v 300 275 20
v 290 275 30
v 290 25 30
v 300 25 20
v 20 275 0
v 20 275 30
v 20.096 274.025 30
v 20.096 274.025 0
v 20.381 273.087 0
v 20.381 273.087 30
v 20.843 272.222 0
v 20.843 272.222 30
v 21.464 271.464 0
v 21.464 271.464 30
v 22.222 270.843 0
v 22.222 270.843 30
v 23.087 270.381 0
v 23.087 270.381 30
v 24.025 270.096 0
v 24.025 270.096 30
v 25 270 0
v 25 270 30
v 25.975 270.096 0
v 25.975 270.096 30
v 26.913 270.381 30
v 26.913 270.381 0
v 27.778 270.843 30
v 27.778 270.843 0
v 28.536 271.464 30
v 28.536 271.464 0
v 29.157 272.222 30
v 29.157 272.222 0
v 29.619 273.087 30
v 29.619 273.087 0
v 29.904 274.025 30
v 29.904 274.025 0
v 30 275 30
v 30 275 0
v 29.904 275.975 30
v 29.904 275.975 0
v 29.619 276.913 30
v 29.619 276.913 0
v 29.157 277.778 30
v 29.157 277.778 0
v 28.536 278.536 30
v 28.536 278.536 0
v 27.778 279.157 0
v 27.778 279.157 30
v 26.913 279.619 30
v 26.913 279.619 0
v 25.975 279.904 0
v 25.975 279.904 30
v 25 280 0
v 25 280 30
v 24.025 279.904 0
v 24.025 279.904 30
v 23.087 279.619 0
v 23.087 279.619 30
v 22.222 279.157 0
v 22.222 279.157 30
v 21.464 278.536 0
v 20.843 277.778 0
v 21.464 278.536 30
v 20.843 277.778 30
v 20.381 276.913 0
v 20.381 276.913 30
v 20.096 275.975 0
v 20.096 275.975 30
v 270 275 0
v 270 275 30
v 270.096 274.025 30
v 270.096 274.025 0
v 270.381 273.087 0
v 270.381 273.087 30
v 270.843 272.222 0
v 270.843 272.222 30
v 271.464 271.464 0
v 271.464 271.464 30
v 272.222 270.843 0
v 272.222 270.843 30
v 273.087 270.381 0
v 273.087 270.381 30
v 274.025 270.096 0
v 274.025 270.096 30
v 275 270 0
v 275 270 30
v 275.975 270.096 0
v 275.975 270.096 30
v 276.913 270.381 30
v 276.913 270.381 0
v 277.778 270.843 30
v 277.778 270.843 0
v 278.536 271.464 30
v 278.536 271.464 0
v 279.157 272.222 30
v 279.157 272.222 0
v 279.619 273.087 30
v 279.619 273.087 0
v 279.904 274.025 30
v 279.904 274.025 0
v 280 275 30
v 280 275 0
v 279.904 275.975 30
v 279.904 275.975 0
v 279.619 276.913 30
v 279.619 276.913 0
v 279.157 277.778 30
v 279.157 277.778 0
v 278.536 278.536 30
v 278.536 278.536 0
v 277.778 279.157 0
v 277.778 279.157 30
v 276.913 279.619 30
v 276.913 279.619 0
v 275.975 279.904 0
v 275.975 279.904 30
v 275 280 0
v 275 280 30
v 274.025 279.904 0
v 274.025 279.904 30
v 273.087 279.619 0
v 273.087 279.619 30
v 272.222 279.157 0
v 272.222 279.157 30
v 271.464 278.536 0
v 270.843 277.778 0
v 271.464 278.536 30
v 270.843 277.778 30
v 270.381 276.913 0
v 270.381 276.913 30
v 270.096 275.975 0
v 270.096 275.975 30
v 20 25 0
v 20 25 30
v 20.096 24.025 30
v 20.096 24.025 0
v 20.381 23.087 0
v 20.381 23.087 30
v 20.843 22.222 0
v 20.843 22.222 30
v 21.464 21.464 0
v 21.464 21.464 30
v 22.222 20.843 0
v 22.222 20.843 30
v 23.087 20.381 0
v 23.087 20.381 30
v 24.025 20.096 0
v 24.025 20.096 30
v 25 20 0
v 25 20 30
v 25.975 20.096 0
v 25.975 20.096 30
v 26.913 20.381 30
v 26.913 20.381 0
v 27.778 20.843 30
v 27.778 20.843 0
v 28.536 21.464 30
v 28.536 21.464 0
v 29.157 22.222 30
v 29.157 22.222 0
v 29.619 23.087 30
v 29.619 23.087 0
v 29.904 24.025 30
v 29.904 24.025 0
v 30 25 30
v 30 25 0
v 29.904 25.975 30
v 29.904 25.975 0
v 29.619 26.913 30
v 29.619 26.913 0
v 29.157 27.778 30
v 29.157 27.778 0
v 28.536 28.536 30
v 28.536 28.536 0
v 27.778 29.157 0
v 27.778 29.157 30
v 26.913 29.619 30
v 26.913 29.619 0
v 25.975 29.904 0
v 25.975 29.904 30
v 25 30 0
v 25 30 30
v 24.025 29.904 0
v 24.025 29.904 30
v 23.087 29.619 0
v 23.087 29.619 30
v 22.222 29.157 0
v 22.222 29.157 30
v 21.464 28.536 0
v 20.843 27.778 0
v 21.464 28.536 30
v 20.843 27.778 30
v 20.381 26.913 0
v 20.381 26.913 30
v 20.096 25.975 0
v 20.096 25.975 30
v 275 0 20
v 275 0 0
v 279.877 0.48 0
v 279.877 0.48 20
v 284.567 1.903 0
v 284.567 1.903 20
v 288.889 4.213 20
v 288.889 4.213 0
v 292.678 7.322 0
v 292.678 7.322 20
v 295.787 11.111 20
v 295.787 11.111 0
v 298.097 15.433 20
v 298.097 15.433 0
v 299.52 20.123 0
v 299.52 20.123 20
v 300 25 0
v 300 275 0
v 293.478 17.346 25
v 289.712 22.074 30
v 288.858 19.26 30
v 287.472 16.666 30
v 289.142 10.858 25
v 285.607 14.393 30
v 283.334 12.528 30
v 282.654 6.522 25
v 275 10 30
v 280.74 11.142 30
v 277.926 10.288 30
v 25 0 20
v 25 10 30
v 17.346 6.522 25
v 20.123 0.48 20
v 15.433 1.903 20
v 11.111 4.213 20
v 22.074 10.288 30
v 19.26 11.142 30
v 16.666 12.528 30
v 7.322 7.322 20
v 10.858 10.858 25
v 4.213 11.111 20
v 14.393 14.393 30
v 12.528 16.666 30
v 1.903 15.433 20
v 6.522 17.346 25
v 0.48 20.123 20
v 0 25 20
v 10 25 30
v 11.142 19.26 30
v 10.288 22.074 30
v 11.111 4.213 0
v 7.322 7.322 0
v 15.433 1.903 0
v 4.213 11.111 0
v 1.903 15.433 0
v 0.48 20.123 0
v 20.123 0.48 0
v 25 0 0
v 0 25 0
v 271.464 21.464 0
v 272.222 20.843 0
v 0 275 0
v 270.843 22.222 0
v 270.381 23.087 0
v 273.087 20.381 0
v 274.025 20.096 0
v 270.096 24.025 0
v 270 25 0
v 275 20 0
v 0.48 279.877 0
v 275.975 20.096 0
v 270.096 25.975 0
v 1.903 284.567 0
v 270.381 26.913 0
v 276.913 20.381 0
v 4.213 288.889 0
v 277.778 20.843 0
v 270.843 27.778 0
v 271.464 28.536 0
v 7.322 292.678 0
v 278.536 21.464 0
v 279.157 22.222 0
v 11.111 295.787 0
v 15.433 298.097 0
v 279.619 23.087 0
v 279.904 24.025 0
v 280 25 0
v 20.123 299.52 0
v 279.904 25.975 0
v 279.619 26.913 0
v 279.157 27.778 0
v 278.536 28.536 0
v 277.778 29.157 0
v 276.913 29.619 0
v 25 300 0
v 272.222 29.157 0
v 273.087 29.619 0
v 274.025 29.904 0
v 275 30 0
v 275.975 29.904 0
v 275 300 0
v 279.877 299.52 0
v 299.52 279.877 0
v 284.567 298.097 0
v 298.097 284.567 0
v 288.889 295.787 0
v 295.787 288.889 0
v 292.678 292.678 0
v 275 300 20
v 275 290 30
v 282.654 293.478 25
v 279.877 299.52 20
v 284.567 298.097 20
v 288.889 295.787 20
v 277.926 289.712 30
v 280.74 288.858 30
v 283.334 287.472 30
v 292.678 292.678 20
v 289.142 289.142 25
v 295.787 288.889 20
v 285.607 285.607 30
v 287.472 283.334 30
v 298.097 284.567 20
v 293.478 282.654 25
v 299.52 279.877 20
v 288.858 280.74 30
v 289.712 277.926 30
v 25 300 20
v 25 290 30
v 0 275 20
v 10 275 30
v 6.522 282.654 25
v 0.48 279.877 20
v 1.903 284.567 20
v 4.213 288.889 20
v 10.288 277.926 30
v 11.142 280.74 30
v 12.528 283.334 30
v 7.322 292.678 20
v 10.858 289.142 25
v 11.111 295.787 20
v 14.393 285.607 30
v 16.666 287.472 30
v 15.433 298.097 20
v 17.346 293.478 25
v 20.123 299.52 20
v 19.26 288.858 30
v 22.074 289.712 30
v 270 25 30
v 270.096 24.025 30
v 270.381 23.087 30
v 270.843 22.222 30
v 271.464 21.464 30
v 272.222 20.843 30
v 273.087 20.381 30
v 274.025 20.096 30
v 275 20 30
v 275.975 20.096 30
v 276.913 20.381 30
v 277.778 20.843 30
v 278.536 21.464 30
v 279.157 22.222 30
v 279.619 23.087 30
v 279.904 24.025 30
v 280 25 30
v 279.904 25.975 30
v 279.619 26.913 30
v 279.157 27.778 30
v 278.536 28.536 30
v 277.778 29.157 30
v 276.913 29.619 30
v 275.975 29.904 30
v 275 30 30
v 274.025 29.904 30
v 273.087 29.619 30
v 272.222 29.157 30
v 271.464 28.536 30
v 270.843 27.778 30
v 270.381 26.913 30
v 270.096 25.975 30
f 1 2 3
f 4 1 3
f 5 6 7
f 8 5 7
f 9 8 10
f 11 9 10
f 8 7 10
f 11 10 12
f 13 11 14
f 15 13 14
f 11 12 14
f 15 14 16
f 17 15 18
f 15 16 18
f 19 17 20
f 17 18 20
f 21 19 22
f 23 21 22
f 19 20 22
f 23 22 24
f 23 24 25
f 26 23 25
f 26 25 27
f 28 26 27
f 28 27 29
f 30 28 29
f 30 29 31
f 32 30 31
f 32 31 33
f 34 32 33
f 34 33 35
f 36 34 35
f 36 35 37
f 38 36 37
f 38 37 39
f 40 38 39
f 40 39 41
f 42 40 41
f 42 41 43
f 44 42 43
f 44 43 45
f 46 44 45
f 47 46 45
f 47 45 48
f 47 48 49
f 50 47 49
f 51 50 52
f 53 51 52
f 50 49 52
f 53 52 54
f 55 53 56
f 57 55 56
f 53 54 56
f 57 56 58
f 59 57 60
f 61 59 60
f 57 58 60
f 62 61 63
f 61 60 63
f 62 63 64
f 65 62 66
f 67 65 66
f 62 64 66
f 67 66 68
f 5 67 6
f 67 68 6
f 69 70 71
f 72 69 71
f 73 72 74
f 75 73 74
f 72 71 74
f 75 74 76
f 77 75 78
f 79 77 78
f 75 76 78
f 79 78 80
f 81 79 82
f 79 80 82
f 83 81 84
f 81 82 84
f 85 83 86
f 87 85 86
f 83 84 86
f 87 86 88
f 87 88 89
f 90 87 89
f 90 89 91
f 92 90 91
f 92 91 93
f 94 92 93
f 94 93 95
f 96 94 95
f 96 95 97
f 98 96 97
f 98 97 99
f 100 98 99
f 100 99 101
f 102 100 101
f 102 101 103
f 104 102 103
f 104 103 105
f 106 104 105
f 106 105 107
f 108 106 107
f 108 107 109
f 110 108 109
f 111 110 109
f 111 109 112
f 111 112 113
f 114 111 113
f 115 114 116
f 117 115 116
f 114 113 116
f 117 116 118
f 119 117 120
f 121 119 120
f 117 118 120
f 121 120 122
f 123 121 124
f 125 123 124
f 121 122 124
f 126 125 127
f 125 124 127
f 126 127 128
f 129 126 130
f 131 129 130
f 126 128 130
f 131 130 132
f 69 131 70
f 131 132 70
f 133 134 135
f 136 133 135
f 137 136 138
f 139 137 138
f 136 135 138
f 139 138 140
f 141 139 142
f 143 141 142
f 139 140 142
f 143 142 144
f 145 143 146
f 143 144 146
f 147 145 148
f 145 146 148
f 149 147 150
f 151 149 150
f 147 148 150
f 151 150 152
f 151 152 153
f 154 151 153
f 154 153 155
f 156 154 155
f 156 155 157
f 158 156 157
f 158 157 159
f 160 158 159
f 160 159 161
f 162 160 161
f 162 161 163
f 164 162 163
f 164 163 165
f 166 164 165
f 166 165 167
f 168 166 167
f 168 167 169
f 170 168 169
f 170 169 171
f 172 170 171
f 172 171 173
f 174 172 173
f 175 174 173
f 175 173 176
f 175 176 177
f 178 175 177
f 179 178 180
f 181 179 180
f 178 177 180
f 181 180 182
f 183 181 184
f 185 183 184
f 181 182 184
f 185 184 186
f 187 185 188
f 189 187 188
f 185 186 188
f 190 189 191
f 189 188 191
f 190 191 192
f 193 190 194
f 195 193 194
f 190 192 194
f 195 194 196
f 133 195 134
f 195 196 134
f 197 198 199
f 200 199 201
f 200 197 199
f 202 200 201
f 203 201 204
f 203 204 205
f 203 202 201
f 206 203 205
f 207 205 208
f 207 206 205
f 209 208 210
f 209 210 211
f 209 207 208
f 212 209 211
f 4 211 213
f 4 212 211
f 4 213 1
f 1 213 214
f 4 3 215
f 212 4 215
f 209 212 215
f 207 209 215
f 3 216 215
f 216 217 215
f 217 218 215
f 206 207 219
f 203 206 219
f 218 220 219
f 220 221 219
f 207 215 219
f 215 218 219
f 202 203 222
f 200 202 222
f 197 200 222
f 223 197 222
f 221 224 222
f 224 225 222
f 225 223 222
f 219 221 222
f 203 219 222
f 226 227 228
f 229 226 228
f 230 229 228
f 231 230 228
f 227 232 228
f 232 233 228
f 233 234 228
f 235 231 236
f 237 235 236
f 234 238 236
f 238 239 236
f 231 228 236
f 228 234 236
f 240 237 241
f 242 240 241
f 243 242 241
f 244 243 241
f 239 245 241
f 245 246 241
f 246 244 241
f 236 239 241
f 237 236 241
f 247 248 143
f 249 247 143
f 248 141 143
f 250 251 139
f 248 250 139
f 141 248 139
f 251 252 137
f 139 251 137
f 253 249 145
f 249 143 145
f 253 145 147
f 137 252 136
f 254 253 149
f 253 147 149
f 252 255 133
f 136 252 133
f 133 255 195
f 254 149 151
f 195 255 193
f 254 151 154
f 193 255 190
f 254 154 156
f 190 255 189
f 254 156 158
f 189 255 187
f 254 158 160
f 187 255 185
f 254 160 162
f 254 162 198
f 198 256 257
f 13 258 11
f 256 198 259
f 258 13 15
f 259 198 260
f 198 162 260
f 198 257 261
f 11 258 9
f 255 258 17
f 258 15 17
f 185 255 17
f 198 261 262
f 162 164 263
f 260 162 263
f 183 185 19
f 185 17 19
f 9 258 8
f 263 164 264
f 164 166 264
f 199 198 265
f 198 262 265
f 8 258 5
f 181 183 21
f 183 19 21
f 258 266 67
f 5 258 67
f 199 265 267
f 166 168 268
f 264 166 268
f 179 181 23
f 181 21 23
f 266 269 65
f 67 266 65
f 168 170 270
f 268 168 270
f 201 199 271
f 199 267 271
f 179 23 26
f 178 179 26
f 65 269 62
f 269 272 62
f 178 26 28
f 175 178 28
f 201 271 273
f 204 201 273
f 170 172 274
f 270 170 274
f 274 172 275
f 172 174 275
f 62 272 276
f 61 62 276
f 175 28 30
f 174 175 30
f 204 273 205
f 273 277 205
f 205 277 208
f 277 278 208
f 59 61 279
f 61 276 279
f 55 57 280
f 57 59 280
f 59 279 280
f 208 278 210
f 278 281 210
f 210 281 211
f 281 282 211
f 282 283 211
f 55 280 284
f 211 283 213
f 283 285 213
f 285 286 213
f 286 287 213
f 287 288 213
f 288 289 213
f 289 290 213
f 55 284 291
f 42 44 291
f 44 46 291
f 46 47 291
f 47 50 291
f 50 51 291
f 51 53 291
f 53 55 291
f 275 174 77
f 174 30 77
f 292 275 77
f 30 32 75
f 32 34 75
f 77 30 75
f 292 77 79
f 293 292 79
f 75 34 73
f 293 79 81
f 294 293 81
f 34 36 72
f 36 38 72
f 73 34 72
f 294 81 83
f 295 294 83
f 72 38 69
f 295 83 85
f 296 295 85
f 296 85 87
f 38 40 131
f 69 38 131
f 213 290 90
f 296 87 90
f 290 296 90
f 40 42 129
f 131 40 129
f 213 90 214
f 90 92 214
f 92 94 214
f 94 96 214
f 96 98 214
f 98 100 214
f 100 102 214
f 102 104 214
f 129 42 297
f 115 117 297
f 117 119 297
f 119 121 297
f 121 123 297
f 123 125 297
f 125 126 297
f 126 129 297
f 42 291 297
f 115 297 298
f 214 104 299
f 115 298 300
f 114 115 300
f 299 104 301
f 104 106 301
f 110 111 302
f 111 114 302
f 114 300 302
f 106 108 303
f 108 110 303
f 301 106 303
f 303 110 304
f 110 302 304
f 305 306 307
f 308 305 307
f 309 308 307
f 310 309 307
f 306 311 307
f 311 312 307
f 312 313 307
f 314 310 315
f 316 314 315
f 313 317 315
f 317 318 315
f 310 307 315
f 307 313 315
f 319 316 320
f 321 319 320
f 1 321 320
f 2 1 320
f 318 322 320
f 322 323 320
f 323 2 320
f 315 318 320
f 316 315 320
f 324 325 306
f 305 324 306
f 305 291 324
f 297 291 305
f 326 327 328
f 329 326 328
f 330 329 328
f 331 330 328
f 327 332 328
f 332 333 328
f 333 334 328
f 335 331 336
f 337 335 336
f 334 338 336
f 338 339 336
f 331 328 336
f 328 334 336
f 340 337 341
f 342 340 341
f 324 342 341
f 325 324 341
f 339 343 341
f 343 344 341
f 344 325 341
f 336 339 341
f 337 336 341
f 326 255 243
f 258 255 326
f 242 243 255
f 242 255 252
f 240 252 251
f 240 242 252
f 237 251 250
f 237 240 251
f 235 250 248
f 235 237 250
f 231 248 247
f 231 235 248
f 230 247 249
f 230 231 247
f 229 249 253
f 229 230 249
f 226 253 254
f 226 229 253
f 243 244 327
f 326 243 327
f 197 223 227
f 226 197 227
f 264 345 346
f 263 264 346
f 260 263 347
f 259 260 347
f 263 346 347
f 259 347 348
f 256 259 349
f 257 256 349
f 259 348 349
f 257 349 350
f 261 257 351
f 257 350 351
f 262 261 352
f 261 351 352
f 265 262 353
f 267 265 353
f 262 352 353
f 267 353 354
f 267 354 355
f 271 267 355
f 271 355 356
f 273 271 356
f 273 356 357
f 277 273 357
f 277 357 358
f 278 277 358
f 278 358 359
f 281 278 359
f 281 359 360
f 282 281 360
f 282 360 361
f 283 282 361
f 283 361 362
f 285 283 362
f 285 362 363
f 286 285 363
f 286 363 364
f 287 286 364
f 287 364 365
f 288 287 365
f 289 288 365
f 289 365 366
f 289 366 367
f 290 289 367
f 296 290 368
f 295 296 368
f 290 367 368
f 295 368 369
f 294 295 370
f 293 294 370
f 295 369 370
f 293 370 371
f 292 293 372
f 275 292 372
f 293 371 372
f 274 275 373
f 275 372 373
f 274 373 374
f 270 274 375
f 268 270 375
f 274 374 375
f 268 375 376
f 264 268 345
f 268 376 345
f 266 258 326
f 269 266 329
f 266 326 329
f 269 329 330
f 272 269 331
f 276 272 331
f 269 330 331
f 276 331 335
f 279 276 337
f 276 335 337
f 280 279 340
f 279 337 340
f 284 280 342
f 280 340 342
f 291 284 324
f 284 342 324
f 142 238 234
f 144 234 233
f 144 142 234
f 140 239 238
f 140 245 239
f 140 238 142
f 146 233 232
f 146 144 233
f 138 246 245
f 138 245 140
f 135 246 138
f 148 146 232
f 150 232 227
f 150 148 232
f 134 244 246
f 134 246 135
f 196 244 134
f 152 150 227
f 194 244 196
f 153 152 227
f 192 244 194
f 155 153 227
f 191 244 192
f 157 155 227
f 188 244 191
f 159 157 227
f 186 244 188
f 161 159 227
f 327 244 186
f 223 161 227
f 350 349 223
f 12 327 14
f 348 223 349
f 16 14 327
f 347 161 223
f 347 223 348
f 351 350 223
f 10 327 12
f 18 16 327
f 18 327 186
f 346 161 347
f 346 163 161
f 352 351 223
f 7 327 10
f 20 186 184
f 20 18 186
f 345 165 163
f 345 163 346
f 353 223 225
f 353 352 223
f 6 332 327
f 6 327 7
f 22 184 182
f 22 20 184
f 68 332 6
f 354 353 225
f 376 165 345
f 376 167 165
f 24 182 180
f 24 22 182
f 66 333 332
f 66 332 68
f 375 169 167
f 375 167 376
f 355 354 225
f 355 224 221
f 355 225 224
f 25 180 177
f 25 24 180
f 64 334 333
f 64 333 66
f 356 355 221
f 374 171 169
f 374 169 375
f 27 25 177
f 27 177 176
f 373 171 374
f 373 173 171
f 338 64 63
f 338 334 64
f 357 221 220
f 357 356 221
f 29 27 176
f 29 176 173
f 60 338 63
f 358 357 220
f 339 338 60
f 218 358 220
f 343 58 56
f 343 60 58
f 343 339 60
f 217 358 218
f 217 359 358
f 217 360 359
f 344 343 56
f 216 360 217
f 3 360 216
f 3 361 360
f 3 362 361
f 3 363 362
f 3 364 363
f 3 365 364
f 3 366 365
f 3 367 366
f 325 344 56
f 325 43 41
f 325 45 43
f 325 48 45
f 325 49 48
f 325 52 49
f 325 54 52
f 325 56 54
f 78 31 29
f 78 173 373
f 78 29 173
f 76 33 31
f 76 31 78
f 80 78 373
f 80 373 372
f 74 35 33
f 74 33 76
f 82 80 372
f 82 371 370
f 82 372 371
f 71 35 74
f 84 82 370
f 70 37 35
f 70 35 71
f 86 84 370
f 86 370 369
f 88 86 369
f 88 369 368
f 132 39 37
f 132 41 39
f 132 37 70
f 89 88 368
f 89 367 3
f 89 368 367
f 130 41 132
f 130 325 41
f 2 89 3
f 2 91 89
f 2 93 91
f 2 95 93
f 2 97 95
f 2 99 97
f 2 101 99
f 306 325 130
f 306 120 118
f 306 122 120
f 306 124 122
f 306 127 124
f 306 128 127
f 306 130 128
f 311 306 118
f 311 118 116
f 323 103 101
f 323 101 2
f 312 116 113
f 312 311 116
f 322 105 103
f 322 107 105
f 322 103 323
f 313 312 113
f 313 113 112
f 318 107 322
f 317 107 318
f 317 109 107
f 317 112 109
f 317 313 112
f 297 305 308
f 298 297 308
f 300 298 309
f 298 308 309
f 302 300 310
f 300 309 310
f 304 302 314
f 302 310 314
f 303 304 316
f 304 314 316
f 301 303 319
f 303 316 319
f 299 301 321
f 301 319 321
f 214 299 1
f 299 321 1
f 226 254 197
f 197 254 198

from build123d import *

# Parameters (mm, degrees)
F0_W     = 300
F0_H     = 300
F1_DEPTH = 30
F2_D     = 10
F3_R     = 25
F4_SIZE2 = 10
F4_SIZE  = 10


with BuildPart() as f1:
    # F0 (on Top) → F1 (new body)
    with BuildSketch(Plane.XY):
        with Locations((150, 150)):
            Rectangle(F0_W, F0_H)
    extrude(amount=F1_DEPTH)

    # F2 (through all)
    with Locations(Plane(origin=(0, 0, 0), x_dir=(1, 0, 0), z_dir=(0, 0, -1))):
        with Locations((275, -275), (25, -275), (275, -25), (25, -25)):
            Hole(F2_D / 2)

    # F3
    f3_edges = [f1.edges().sort_by_distance(p)[0] for p in [
        (0, 300, 15),
        (0, 0, 15),
        (300, 0, 15),
        (300, 300, 15),
    ]]
    fillet(f3_edges, radius=F3_R)

    # F4
    f4_edges = [f1.edges().sort_by_distance(p)[0] for p in [
        (0, 150, 30),
    ]]
    chamfer(f4_edges, length=F4_SIZE, length2=F4_SIZE2)


solid = f1.part
